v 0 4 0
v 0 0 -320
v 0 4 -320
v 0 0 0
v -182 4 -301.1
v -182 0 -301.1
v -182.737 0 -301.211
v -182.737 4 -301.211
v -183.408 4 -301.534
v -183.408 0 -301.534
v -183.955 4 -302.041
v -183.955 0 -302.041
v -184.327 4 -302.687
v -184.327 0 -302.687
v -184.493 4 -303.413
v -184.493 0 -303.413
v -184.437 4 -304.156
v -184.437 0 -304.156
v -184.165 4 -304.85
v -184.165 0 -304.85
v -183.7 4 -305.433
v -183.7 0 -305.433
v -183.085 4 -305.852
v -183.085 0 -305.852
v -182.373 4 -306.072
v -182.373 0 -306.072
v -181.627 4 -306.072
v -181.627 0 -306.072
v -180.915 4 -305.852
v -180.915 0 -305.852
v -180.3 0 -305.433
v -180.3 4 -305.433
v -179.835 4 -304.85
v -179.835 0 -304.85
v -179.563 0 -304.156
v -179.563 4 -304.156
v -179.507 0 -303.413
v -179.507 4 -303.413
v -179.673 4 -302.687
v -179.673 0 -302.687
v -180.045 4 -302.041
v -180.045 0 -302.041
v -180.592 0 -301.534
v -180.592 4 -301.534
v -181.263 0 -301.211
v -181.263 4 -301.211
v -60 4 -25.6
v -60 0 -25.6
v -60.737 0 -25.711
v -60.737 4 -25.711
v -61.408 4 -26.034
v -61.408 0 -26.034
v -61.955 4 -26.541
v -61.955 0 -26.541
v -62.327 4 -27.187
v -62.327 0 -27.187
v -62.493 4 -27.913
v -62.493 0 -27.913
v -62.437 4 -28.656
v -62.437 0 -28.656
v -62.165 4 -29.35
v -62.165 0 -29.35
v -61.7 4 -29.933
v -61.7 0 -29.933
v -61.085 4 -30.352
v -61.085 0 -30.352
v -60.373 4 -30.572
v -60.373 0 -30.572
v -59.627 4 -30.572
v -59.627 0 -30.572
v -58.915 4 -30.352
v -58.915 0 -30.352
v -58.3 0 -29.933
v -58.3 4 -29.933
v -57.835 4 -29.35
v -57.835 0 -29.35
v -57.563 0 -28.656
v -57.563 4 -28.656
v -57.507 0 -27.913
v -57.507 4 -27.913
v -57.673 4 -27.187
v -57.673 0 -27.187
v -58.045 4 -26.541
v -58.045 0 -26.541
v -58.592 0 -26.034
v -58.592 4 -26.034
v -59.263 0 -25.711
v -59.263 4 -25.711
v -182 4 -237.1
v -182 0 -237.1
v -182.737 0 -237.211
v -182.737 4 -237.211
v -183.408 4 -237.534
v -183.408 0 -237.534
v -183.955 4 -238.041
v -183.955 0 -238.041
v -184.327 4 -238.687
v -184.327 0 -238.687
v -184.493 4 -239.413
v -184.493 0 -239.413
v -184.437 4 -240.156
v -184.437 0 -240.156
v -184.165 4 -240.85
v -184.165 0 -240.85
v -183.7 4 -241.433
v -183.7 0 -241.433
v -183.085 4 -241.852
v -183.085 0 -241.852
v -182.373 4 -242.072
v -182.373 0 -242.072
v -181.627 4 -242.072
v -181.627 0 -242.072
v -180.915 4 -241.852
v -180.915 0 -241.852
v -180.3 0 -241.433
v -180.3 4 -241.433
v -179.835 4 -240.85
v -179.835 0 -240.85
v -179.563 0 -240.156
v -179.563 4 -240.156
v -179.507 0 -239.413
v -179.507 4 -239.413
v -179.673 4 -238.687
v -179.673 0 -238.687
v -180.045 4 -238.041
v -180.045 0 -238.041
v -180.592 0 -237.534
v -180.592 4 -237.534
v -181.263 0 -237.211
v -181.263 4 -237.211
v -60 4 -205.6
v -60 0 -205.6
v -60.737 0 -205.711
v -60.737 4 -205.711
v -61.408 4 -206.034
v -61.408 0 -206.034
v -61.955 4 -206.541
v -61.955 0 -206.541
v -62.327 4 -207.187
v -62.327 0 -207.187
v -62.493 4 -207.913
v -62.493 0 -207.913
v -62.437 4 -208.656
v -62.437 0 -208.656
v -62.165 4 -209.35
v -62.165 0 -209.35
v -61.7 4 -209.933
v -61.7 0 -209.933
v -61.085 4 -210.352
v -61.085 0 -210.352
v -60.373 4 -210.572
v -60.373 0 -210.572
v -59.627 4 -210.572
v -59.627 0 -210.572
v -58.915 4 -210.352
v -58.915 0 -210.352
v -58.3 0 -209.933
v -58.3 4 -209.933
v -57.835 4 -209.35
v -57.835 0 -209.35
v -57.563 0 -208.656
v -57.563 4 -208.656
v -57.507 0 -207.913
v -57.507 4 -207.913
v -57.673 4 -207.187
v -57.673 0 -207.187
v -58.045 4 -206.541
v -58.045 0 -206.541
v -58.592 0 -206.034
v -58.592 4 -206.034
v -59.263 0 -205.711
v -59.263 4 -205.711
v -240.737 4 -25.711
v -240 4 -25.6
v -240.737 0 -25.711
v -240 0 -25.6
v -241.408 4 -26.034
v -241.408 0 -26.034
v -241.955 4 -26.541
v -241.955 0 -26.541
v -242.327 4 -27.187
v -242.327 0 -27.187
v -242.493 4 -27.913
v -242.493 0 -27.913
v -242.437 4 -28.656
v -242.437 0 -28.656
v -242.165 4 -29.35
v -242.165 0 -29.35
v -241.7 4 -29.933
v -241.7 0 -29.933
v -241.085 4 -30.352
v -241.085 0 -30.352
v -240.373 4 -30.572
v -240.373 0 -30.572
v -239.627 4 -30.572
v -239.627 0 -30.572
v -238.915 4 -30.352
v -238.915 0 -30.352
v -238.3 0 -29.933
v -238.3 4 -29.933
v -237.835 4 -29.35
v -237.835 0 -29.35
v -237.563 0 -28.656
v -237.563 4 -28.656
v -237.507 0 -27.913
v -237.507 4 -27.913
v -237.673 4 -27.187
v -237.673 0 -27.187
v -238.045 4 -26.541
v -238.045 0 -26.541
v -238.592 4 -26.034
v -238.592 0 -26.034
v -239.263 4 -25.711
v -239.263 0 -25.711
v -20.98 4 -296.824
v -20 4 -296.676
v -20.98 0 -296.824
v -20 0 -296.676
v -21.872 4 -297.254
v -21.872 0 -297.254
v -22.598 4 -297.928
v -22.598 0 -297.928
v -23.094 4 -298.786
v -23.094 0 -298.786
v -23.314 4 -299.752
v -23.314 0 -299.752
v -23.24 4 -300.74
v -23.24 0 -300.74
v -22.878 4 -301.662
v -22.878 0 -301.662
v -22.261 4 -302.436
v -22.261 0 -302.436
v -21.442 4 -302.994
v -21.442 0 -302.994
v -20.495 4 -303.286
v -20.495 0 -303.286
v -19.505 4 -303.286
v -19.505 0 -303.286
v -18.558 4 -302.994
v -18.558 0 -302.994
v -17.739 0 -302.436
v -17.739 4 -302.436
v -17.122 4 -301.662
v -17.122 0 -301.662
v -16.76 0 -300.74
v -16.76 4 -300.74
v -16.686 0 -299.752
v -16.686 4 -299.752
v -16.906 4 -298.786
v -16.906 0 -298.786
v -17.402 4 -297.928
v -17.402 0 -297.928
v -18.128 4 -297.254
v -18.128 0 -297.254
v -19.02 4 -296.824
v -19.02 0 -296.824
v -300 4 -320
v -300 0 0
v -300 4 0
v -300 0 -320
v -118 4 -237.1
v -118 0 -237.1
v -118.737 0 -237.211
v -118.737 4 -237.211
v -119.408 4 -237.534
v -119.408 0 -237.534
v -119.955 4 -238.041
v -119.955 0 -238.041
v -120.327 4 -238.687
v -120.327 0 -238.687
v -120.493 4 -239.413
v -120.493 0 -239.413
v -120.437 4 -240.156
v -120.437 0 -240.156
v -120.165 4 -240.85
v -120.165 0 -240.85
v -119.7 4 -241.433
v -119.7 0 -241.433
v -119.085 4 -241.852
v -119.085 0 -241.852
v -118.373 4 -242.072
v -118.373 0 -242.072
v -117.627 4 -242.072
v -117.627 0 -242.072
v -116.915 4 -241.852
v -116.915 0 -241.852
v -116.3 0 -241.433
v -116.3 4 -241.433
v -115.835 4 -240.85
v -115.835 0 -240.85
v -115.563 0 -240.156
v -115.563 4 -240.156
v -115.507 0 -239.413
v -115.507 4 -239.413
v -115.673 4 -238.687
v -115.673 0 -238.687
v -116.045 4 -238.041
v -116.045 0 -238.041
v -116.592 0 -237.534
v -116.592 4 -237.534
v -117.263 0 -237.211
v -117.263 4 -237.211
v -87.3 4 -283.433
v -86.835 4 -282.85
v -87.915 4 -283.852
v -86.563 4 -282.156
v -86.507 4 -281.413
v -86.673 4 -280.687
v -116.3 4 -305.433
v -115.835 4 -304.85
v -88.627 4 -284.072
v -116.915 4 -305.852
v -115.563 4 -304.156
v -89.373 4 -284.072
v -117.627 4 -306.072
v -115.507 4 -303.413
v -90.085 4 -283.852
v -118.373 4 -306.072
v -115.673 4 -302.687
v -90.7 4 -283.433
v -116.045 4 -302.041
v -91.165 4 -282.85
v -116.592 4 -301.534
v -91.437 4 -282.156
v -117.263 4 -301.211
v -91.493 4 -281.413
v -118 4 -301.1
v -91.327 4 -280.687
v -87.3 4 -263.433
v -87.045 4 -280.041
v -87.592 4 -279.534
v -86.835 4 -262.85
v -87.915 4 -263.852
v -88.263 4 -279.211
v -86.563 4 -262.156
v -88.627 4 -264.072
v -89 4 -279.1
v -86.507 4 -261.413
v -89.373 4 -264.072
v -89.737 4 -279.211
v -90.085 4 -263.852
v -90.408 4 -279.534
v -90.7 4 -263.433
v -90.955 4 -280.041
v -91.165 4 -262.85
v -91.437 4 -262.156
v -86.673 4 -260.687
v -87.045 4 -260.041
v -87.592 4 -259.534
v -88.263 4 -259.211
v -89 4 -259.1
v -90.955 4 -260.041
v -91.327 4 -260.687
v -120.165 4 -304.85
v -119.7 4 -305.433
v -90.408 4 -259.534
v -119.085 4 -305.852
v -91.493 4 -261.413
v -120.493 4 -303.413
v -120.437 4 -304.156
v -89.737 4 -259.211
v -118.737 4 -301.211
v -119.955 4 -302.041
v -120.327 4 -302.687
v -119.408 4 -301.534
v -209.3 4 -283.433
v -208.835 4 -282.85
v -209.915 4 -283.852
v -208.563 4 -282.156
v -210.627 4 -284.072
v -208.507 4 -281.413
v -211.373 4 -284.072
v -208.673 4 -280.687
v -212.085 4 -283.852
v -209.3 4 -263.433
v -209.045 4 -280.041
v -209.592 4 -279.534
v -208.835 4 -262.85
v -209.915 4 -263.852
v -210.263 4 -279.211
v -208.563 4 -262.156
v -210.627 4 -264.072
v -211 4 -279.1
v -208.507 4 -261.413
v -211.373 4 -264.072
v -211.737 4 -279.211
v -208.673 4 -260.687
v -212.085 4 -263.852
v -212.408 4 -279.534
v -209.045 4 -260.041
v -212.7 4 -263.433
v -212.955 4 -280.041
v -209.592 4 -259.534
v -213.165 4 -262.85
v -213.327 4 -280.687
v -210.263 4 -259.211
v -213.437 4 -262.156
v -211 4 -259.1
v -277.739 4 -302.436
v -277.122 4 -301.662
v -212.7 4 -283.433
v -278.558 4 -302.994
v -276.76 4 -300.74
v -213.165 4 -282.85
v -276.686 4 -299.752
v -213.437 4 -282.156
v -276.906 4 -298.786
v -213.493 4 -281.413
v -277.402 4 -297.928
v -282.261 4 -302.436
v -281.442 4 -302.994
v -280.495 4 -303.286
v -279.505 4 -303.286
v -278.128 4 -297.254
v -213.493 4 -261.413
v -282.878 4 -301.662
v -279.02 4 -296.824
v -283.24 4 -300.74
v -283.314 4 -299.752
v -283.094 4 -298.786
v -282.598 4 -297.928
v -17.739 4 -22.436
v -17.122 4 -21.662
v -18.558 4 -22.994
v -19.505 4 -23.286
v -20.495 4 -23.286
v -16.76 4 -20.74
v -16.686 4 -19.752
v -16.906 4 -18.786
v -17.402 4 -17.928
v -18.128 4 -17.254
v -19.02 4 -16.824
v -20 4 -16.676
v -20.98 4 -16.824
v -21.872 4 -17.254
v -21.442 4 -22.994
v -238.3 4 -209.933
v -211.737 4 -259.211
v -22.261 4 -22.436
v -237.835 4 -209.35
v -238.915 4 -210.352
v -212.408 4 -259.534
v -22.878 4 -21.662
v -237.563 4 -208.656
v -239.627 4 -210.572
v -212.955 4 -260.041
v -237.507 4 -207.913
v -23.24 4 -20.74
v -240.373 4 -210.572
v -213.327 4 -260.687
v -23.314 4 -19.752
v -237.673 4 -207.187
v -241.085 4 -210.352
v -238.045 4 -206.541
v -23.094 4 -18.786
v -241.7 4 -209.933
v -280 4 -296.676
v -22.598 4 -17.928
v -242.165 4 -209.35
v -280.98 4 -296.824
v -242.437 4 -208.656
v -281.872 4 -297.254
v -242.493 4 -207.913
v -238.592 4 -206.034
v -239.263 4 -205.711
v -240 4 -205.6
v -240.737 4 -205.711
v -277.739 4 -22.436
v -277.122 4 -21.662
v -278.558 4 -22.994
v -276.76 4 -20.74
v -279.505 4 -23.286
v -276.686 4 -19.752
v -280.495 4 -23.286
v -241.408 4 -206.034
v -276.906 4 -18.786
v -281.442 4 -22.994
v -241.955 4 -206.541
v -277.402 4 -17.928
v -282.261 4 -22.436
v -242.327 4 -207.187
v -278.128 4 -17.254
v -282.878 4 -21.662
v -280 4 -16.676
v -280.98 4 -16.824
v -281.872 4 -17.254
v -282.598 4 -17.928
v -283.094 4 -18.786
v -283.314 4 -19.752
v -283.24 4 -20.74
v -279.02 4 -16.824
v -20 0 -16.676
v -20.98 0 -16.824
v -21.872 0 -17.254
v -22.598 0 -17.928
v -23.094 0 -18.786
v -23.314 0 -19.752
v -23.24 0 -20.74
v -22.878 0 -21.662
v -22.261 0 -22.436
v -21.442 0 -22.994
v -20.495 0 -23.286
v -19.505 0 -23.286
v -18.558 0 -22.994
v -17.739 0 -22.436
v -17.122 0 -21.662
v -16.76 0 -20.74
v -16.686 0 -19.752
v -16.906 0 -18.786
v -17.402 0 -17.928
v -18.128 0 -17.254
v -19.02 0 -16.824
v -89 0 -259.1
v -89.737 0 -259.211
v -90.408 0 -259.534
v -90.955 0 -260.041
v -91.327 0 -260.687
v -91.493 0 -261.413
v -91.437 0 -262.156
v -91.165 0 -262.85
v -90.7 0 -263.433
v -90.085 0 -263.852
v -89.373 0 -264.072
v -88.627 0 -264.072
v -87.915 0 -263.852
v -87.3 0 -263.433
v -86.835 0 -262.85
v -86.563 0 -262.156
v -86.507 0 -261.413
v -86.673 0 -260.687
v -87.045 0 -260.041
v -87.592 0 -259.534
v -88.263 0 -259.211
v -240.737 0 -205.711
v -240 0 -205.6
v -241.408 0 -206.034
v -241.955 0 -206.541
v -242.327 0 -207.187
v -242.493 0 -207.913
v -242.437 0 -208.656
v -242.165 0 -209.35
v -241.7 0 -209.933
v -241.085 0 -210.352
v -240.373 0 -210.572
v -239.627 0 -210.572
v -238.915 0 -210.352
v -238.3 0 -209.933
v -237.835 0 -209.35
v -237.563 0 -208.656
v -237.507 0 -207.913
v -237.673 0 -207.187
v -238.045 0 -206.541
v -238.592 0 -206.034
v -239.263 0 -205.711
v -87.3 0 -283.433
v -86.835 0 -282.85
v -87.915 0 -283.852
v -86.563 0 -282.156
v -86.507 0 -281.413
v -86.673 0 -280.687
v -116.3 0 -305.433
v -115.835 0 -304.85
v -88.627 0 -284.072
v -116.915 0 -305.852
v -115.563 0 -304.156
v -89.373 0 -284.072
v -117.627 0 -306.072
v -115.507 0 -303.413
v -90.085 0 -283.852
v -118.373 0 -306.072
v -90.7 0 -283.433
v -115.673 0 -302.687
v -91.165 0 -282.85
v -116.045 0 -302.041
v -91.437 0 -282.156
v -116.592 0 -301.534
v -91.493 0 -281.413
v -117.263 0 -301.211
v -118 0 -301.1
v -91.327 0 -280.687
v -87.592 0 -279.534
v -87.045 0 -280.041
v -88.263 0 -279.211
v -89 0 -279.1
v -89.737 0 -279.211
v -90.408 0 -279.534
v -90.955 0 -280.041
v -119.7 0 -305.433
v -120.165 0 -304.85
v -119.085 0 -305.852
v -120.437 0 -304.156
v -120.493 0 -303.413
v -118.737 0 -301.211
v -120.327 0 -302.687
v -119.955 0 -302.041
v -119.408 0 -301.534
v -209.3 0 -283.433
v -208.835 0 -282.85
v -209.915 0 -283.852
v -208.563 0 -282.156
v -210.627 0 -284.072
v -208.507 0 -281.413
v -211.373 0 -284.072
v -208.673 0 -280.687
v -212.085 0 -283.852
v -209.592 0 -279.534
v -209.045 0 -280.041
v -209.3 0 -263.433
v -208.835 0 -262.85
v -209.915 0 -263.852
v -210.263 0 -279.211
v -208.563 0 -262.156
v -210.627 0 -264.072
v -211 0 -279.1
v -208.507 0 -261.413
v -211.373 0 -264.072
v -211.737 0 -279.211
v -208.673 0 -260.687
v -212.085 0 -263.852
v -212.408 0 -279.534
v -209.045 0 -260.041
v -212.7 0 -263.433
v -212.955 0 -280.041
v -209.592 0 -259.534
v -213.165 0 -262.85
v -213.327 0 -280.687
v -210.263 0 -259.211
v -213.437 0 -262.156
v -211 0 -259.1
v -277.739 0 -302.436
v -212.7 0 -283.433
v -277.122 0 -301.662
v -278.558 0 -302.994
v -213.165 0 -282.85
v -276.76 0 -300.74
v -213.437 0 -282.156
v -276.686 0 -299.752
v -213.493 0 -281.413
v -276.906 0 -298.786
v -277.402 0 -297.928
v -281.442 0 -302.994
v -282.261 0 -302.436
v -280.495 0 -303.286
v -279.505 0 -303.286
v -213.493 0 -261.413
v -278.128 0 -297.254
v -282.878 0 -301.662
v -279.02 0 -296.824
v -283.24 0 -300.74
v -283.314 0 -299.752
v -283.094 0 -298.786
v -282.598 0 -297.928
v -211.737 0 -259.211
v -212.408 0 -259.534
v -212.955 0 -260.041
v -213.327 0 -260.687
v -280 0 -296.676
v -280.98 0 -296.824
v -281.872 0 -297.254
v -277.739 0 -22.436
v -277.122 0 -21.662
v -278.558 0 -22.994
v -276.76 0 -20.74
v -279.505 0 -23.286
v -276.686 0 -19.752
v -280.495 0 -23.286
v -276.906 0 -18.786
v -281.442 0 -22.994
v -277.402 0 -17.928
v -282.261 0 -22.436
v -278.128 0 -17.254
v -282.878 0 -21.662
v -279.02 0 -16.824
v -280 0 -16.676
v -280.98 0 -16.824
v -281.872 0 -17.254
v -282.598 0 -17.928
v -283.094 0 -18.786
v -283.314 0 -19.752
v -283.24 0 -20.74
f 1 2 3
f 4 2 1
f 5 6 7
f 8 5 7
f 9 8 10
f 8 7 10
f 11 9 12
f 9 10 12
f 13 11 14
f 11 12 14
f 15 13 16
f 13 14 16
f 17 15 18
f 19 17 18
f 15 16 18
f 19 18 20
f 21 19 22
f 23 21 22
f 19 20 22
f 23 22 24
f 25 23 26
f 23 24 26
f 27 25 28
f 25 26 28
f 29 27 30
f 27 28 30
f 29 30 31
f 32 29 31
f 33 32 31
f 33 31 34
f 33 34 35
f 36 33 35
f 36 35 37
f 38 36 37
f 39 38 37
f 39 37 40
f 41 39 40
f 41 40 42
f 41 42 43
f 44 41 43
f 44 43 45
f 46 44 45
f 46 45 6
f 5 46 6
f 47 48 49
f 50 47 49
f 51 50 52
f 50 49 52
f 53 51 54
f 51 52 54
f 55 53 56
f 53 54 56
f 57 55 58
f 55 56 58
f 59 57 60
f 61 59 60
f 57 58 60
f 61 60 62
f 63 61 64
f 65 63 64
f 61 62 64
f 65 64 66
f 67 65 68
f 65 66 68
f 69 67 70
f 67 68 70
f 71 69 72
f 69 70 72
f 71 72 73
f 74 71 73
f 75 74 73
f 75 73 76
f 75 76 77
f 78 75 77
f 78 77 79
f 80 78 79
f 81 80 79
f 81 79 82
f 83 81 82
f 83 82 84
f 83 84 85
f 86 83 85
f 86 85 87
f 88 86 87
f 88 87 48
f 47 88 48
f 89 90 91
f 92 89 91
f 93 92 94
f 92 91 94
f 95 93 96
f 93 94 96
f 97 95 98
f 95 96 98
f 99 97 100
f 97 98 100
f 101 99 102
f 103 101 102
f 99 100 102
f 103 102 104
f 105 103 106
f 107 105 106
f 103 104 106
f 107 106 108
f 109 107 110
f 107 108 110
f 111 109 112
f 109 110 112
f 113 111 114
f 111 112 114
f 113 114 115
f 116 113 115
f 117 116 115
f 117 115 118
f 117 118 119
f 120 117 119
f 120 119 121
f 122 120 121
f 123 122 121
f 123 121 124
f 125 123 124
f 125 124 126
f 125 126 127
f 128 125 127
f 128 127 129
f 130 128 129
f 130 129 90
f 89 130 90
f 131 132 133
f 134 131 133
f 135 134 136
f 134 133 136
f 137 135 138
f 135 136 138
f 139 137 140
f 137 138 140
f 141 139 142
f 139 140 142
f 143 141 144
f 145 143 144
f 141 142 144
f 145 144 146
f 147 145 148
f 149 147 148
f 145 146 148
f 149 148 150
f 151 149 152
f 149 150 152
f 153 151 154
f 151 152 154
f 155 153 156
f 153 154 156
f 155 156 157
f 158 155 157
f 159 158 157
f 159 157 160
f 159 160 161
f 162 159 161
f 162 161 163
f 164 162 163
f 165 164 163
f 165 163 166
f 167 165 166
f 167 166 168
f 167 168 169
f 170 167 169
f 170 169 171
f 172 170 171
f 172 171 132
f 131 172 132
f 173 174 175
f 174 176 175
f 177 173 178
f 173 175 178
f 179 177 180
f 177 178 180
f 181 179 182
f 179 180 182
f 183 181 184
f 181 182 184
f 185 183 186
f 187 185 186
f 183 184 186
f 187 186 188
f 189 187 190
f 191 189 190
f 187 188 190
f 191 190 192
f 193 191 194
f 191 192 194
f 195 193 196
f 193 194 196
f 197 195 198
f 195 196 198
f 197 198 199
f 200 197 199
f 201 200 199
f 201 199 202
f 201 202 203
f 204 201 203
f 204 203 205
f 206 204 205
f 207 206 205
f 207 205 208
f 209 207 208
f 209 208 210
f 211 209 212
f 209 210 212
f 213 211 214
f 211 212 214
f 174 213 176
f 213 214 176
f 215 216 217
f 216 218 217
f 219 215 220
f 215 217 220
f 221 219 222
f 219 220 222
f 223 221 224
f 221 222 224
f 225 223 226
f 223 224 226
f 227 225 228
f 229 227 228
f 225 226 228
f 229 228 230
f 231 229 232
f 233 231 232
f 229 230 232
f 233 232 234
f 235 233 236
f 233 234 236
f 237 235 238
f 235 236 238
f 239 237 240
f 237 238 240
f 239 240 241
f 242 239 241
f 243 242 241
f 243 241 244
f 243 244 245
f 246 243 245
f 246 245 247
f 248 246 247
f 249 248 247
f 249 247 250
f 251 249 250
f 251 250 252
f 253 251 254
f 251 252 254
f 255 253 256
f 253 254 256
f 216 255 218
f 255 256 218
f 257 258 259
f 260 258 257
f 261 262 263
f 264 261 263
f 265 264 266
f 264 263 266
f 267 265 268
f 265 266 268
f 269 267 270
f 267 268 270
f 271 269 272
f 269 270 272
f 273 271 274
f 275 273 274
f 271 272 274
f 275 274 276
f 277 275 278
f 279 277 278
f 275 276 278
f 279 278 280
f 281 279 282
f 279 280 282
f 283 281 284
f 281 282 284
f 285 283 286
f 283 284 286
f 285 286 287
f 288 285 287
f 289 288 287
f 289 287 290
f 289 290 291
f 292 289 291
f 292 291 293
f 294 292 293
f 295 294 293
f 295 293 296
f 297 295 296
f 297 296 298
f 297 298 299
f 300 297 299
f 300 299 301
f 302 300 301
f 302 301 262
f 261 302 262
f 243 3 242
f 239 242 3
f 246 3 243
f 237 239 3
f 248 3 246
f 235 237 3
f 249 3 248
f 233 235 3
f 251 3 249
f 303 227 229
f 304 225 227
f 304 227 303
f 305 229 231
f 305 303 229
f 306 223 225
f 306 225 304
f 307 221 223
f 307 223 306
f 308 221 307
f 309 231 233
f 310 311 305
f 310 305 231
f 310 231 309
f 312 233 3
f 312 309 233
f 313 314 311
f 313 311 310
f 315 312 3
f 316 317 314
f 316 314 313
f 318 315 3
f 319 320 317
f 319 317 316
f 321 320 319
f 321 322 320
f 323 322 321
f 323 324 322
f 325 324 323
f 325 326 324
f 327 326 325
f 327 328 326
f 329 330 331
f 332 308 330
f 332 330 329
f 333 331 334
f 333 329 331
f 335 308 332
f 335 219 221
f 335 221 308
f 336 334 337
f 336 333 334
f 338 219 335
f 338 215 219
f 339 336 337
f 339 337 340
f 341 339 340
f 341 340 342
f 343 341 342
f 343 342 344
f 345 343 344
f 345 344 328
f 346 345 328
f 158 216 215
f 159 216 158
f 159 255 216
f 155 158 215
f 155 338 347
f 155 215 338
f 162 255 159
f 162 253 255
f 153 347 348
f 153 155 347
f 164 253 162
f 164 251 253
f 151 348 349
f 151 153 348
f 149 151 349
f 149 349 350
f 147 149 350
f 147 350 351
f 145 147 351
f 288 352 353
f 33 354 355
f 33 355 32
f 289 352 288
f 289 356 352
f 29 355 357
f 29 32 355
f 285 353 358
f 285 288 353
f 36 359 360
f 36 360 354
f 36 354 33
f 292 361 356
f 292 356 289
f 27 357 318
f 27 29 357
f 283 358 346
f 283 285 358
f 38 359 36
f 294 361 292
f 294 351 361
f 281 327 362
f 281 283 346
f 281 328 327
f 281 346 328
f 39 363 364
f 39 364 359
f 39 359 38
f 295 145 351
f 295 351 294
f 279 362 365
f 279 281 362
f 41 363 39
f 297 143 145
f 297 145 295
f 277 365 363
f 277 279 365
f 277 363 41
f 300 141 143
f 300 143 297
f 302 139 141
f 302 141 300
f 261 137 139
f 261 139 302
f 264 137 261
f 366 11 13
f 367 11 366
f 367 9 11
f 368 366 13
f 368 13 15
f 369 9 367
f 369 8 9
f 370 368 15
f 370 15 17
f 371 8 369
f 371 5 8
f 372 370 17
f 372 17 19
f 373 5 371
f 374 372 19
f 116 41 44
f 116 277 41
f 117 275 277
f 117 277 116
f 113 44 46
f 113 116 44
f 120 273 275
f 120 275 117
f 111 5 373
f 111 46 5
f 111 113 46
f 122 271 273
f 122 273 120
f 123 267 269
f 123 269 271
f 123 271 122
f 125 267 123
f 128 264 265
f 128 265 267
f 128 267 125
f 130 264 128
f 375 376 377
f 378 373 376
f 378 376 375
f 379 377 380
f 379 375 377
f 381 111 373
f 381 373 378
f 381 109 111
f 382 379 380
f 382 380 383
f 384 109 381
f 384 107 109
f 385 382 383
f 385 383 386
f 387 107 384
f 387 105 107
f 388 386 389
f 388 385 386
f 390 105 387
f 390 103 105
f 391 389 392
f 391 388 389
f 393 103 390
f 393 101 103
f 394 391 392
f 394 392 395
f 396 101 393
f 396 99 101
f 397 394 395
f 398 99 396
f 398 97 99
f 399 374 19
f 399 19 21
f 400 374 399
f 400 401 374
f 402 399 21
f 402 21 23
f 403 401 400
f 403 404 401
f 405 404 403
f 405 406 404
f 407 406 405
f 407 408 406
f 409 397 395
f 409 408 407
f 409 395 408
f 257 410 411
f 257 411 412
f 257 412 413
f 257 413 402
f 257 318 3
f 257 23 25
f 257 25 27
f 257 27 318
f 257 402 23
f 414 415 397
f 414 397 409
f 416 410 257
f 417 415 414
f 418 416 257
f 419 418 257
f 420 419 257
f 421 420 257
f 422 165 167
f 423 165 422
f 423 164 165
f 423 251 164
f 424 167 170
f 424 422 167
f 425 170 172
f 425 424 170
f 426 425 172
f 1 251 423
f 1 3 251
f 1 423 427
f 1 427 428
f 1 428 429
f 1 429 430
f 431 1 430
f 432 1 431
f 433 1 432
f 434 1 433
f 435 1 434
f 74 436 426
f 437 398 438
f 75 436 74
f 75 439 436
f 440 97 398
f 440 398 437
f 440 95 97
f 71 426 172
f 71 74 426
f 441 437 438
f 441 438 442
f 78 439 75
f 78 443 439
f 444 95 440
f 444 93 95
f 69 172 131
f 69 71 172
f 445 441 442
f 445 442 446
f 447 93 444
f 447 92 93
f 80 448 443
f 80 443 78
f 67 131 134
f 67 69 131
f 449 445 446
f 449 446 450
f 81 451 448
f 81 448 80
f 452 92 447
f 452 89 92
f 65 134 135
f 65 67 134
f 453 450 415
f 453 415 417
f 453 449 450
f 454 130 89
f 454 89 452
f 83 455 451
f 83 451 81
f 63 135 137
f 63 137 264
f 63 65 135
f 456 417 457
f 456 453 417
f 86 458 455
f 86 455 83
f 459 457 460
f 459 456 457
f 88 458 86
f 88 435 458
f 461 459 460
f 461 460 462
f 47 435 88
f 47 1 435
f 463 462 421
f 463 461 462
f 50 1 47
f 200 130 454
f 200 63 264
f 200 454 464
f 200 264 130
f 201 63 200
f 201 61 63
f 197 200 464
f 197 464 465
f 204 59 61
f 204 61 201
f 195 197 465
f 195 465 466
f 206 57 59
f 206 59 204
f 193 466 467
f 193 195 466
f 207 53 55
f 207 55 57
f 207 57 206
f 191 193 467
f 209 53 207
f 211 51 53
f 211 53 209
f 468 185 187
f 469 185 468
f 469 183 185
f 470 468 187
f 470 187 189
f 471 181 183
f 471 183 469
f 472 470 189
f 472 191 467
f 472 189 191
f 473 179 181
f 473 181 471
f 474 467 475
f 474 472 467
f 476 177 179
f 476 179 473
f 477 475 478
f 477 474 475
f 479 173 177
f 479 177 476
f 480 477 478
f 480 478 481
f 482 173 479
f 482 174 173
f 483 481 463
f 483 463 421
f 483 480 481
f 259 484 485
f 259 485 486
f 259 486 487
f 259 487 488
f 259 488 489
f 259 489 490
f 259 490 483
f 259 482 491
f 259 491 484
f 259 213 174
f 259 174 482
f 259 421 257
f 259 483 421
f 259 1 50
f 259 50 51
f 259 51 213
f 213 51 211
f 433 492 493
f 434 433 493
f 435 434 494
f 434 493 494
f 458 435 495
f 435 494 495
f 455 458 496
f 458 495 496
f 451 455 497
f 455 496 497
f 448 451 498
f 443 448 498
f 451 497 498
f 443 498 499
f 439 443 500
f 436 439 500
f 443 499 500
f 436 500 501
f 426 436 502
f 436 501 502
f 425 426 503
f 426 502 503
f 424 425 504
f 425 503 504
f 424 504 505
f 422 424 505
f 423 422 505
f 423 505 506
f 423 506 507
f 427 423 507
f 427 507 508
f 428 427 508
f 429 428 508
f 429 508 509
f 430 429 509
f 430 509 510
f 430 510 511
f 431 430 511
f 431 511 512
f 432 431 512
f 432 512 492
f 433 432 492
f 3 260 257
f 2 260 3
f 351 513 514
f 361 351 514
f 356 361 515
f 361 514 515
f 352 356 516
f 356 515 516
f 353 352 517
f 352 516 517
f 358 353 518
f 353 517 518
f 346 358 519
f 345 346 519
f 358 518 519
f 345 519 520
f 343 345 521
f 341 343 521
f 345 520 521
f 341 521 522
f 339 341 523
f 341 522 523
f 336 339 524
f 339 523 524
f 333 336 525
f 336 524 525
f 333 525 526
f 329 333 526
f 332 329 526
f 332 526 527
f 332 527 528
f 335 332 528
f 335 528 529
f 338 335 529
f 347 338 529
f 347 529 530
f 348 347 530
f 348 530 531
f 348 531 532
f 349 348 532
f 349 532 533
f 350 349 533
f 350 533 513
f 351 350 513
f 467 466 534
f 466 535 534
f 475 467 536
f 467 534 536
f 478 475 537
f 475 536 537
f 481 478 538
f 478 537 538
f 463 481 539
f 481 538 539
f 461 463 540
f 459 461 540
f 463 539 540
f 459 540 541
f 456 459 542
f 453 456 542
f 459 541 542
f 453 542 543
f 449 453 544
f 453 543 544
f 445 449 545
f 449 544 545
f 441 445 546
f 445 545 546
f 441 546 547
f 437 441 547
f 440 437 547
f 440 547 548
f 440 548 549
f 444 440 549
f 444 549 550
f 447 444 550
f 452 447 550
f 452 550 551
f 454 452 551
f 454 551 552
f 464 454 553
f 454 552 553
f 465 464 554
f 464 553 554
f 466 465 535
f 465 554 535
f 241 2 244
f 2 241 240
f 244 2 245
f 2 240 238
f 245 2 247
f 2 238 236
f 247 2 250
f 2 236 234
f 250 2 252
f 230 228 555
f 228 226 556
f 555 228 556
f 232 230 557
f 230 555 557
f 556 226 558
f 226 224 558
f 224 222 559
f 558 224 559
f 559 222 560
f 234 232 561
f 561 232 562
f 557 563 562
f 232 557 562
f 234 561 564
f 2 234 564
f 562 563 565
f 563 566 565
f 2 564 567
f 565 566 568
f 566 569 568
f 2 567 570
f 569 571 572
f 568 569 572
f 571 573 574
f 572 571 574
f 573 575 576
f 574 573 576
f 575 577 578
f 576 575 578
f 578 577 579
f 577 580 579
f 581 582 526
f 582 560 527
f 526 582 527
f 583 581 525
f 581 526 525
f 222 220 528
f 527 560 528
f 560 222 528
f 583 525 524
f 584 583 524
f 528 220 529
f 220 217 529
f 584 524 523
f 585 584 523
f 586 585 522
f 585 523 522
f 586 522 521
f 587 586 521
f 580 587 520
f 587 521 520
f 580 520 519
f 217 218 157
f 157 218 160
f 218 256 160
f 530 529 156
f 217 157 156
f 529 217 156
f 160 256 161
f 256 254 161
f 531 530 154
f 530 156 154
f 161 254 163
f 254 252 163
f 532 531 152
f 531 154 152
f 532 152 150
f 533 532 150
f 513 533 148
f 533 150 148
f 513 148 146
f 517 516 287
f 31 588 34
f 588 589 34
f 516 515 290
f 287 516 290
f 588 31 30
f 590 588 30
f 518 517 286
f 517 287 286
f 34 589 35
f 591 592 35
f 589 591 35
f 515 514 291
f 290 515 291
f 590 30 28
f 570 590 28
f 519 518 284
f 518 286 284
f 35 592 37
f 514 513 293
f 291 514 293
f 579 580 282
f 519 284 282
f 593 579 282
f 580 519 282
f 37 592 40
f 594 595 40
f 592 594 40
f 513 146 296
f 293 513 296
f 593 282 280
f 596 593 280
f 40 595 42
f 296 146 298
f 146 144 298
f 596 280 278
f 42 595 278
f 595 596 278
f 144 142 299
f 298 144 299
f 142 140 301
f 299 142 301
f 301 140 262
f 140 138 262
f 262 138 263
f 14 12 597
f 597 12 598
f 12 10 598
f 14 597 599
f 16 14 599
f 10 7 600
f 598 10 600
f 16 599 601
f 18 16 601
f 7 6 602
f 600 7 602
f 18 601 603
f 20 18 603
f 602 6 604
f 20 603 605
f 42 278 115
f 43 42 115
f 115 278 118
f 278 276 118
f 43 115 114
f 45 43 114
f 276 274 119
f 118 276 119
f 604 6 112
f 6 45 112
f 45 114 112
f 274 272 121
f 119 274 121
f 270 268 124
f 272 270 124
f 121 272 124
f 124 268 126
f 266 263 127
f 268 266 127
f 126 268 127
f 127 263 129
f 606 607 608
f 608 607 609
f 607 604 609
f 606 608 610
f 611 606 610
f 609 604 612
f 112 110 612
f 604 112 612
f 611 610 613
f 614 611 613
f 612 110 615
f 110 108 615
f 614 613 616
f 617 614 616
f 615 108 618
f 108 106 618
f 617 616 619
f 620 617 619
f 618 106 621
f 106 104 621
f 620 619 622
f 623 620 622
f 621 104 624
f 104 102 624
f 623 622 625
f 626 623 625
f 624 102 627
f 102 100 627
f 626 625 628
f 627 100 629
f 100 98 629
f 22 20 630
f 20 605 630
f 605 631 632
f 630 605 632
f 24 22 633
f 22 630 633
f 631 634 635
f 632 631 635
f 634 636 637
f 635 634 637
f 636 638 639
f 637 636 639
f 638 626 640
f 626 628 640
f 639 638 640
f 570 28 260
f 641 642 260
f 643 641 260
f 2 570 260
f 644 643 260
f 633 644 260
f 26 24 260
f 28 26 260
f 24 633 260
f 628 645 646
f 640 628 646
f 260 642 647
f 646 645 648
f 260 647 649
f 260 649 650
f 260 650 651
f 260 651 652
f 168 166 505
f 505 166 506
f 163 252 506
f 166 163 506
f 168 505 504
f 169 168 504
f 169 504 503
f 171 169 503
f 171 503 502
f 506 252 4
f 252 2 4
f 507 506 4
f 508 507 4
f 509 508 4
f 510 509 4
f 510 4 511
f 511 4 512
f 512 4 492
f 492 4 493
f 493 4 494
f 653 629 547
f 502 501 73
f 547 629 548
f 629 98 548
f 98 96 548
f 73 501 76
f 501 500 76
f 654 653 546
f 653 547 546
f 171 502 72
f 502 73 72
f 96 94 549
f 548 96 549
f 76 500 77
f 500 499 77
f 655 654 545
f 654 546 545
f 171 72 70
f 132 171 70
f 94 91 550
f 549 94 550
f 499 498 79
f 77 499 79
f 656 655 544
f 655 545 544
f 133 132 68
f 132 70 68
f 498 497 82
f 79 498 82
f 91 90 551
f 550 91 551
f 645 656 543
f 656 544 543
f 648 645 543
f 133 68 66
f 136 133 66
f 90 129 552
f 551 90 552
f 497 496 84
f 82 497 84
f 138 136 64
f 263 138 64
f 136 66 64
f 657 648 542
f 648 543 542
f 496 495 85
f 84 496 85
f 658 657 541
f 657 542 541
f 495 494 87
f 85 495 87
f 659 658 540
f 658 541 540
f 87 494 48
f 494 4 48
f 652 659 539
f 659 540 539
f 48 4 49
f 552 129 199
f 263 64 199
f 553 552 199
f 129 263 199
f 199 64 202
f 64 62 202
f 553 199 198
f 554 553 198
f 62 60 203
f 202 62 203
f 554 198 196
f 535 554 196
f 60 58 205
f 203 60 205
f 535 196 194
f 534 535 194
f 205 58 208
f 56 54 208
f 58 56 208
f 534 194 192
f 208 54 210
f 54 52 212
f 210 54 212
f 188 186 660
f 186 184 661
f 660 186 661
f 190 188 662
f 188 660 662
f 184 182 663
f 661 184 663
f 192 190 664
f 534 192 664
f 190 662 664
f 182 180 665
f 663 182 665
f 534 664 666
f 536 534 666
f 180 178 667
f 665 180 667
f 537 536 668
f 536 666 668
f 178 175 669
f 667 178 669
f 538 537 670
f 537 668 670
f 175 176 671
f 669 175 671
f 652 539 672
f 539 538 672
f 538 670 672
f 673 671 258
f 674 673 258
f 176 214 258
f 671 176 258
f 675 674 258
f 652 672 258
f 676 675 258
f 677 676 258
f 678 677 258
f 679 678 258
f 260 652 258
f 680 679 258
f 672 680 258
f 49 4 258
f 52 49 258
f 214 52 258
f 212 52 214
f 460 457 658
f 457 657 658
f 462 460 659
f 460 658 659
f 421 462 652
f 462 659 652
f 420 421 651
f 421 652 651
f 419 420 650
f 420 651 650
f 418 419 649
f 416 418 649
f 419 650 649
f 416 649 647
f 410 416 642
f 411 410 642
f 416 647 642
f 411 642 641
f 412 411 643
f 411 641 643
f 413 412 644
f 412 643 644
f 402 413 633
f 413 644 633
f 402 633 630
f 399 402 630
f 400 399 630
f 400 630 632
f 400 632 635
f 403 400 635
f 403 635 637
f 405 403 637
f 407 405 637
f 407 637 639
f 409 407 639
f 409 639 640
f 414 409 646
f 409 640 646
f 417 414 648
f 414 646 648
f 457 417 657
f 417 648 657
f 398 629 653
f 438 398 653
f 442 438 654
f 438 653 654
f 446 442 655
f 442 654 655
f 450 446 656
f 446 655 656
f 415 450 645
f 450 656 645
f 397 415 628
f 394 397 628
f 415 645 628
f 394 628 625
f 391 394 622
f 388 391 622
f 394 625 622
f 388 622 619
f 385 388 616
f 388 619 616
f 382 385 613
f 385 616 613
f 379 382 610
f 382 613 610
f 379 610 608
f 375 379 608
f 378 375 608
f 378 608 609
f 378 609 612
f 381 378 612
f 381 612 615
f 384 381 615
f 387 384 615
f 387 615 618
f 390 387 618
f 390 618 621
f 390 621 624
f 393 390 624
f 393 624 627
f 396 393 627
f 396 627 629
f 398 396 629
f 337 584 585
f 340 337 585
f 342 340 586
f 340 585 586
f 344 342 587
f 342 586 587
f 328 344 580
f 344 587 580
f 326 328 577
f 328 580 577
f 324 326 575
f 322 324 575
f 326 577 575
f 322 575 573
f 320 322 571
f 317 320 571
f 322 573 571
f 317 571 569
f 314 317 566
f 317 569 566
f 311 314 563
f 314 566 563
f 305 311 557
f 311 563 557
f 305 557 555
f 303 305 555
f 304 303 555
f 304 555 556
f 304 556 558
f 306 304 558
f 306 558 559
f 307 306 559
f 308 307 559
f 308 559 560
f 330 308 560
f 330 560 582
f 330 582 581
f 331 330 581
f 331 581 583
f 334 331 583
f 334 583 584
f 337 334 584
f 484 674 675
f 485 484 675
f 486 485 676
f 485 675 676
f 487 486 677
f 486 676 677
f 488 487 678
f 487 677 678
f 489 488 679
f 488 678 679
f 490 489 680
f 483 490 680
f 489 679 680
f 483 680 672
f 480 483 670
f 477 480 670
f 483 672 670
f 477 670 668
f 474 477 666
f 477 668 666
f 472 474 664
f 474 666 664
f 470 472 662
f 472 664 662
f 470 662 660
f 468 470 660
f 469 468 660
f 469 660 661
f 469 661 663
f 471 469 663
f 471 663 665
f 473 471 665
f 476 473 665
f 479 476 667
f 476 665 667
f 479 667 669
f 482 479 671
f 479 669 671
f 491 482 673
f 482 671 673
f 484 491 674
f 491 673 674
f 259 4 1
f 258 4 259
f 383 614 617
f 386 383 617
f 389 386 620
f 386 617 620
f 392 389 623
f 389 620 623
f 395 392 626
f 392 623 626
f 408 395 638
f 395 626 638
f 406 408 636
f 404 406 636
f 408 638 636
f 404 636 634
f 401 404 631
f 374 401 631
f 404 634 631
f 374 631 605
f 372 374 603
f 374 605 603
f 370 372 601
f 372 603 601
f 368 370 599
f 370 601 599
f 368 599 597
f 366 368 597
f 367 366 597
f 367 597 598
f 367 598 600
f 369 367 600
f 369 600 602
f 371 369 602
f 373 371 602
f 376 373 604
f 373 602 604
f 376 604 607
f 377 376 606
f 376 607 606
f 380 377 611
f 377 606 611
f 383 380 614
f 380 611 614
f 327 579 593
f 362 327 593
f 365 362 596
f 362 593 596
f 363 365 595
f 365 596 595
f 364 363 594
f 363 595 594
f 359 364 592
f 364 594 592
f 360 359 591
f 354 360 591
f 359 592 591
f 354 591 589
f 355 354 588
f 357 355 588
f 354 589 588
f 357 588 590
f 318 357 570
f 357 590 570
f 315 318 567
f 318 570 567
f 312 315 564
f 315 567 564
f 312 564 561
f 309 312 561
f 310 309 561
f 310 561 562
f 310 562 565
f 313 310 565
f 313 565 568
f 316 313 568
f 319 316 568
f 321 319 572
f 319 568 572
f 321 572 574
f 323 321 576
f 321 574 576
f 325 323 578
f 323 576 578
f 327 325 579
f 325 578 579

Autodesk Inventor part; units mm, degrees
ref_plane "YZ Plane" through (0, 0, 0) normal (1, 0, 0) x (0, 1, 0)
ref_plane "XZ Plane" through (0, 0, 0) normal (0, 1, 0) x (-1, 0, 0)
ref_plane "XY Plane" through (0, 0, 0) normal (0, 0, 1) x (1, 0, 0)
sketch "Esboço1" plane through (0, 0, 0) normal (0, 1, 0) x (-1, 0, 0)
  line L0 (0, 0) -> (300, 0)
  line L1 (300, 0) -> (300, -320)
  line L2 (300, -320) -> (0, -320)
  line L3 (0, -320) -> (0, 0)
  dimension "d0" = 300
  dimension "d1" = 320
extrude "Extrusão1" add sketch "Esboço1" along normal blind 4
sketch "Sketch4" plane through (0, 4, 0) normal (0, 1, 0) x (1, 0, 0)
  line L0 (-300, 320) -> (-300, 0) projected
  line L1 (-300, 0) -> (0, 0) projected
  line L2 (0, 320) -> (-300, 320) projected
  line L3 (0, 0) -> (0, 320) projected
  point P0 (-182, 239.6)
  point P1 (-182, 303.6)
  point P2 (-118, 239.6)
  point P3 (-118, 303.6)
  point P4 (-211, 281.6)
  point P5 (-89, 281.6)
  point P6 (-211, 261.6)
  point P7 (-89, 261.6)
  point P8 (-240, 28.1)
  point P9 (-240, 208.1)
  point P10 (-60, 28.1)
  point P11 (-60, 208.1)
  dimension "d25" = 64
  dimension "d28" = 64
  dimension "d32" = 300
  dimension "d33" = 320
  dimension "d41" = 16.4
  dimension "d42" = 118
  dimension "d45" = 122
  dimension "d48" = 20
  dimension "d51" = 38.4
  dimension "d52" = 89
  dimension "d55" = 180
  dimension "d58" = 180
  dimension "d61" = 60
  dimension "d62" = 28.1
hole "Hole1" at (-182, 4, -239.6) at (-182, 4, -303.6) at (-118, 4, -239.6) at (-118, 4, -303.6) at (-211, 4, -261.6) at (-211, 4, -281.6) at (-89, 4, -281.6) at (-89, 4, -261.6) at (-240, 4, -28.1) at (-240, 4, -208.1) at (-60, 4, -208.1) at (-60, 4, -28.1) direction (0, -1, 0) diameter 5 end through all
sketch "Sketch5" plane through (0, 4, 0) normal (0, 1, 0) x (1, 0, 0)
  line L0 (-300, 320) -> (-300, 0) projected
  line L1 (-300, 0) -> (0, 0) projected
  point P0 (-280, 20)
  point P1 (-280, 300)
  point P2 (-20, 20)
  point P3 (-20, 300)
  dimension "d65" = 280
  dimension "d68" = 260
  dimension "d71" = 320
  dimension "d72" = 300
  dimension "d73" = 20
  dimension "d74" = 20
hole "Hole2" at (-280, 4, -20) at (-280, 4, -300) at (-20, 4, -20) at (-20, 4, -300) direction (0, -1, 0) diameter 6.647 end through all thread size "M8x1.25" class "6H" standard "ISO Metric profile"
equation "\"d42\" = -0.5 * d28 + 0.5 * d32"
equation "\"d52\" = 0.5 * d32 - 0.5 * d45"
equation "\"d61\" = 0.5 * d32 - 0.5 * d58"
equation "\"d39\" = Espessura"
equation "\"d73\" = 0.5 * d71 - 0.5 * d65"
equation "\"d74\" = 0.5 * d72 - 0.5 * d68"
equation "\"Raio_vergadura\" = Espessura"
equation "\"Largura_alívio_de_vergadura\" = Espessura"
equation "\"Profundidade_alívio_de_vergadura\" = 0.5 * Espessura"
equation "\"Tamanho_alívio_de_dobra\" = 4 * Espessura"
equation "\"Remanescente_mínimo\" = 2 * Espessura"
equation "\"Raiodetransição\" = Raio_vergadura"
equation "\"Tamanho_de_raio_de_Jacobi\" = Raio_vergadura"
equation "\"TamanhoFolga\" = Espessura"
equation "\"Espessura\" = 0.5"
properties part number "Base" material "Steel"
